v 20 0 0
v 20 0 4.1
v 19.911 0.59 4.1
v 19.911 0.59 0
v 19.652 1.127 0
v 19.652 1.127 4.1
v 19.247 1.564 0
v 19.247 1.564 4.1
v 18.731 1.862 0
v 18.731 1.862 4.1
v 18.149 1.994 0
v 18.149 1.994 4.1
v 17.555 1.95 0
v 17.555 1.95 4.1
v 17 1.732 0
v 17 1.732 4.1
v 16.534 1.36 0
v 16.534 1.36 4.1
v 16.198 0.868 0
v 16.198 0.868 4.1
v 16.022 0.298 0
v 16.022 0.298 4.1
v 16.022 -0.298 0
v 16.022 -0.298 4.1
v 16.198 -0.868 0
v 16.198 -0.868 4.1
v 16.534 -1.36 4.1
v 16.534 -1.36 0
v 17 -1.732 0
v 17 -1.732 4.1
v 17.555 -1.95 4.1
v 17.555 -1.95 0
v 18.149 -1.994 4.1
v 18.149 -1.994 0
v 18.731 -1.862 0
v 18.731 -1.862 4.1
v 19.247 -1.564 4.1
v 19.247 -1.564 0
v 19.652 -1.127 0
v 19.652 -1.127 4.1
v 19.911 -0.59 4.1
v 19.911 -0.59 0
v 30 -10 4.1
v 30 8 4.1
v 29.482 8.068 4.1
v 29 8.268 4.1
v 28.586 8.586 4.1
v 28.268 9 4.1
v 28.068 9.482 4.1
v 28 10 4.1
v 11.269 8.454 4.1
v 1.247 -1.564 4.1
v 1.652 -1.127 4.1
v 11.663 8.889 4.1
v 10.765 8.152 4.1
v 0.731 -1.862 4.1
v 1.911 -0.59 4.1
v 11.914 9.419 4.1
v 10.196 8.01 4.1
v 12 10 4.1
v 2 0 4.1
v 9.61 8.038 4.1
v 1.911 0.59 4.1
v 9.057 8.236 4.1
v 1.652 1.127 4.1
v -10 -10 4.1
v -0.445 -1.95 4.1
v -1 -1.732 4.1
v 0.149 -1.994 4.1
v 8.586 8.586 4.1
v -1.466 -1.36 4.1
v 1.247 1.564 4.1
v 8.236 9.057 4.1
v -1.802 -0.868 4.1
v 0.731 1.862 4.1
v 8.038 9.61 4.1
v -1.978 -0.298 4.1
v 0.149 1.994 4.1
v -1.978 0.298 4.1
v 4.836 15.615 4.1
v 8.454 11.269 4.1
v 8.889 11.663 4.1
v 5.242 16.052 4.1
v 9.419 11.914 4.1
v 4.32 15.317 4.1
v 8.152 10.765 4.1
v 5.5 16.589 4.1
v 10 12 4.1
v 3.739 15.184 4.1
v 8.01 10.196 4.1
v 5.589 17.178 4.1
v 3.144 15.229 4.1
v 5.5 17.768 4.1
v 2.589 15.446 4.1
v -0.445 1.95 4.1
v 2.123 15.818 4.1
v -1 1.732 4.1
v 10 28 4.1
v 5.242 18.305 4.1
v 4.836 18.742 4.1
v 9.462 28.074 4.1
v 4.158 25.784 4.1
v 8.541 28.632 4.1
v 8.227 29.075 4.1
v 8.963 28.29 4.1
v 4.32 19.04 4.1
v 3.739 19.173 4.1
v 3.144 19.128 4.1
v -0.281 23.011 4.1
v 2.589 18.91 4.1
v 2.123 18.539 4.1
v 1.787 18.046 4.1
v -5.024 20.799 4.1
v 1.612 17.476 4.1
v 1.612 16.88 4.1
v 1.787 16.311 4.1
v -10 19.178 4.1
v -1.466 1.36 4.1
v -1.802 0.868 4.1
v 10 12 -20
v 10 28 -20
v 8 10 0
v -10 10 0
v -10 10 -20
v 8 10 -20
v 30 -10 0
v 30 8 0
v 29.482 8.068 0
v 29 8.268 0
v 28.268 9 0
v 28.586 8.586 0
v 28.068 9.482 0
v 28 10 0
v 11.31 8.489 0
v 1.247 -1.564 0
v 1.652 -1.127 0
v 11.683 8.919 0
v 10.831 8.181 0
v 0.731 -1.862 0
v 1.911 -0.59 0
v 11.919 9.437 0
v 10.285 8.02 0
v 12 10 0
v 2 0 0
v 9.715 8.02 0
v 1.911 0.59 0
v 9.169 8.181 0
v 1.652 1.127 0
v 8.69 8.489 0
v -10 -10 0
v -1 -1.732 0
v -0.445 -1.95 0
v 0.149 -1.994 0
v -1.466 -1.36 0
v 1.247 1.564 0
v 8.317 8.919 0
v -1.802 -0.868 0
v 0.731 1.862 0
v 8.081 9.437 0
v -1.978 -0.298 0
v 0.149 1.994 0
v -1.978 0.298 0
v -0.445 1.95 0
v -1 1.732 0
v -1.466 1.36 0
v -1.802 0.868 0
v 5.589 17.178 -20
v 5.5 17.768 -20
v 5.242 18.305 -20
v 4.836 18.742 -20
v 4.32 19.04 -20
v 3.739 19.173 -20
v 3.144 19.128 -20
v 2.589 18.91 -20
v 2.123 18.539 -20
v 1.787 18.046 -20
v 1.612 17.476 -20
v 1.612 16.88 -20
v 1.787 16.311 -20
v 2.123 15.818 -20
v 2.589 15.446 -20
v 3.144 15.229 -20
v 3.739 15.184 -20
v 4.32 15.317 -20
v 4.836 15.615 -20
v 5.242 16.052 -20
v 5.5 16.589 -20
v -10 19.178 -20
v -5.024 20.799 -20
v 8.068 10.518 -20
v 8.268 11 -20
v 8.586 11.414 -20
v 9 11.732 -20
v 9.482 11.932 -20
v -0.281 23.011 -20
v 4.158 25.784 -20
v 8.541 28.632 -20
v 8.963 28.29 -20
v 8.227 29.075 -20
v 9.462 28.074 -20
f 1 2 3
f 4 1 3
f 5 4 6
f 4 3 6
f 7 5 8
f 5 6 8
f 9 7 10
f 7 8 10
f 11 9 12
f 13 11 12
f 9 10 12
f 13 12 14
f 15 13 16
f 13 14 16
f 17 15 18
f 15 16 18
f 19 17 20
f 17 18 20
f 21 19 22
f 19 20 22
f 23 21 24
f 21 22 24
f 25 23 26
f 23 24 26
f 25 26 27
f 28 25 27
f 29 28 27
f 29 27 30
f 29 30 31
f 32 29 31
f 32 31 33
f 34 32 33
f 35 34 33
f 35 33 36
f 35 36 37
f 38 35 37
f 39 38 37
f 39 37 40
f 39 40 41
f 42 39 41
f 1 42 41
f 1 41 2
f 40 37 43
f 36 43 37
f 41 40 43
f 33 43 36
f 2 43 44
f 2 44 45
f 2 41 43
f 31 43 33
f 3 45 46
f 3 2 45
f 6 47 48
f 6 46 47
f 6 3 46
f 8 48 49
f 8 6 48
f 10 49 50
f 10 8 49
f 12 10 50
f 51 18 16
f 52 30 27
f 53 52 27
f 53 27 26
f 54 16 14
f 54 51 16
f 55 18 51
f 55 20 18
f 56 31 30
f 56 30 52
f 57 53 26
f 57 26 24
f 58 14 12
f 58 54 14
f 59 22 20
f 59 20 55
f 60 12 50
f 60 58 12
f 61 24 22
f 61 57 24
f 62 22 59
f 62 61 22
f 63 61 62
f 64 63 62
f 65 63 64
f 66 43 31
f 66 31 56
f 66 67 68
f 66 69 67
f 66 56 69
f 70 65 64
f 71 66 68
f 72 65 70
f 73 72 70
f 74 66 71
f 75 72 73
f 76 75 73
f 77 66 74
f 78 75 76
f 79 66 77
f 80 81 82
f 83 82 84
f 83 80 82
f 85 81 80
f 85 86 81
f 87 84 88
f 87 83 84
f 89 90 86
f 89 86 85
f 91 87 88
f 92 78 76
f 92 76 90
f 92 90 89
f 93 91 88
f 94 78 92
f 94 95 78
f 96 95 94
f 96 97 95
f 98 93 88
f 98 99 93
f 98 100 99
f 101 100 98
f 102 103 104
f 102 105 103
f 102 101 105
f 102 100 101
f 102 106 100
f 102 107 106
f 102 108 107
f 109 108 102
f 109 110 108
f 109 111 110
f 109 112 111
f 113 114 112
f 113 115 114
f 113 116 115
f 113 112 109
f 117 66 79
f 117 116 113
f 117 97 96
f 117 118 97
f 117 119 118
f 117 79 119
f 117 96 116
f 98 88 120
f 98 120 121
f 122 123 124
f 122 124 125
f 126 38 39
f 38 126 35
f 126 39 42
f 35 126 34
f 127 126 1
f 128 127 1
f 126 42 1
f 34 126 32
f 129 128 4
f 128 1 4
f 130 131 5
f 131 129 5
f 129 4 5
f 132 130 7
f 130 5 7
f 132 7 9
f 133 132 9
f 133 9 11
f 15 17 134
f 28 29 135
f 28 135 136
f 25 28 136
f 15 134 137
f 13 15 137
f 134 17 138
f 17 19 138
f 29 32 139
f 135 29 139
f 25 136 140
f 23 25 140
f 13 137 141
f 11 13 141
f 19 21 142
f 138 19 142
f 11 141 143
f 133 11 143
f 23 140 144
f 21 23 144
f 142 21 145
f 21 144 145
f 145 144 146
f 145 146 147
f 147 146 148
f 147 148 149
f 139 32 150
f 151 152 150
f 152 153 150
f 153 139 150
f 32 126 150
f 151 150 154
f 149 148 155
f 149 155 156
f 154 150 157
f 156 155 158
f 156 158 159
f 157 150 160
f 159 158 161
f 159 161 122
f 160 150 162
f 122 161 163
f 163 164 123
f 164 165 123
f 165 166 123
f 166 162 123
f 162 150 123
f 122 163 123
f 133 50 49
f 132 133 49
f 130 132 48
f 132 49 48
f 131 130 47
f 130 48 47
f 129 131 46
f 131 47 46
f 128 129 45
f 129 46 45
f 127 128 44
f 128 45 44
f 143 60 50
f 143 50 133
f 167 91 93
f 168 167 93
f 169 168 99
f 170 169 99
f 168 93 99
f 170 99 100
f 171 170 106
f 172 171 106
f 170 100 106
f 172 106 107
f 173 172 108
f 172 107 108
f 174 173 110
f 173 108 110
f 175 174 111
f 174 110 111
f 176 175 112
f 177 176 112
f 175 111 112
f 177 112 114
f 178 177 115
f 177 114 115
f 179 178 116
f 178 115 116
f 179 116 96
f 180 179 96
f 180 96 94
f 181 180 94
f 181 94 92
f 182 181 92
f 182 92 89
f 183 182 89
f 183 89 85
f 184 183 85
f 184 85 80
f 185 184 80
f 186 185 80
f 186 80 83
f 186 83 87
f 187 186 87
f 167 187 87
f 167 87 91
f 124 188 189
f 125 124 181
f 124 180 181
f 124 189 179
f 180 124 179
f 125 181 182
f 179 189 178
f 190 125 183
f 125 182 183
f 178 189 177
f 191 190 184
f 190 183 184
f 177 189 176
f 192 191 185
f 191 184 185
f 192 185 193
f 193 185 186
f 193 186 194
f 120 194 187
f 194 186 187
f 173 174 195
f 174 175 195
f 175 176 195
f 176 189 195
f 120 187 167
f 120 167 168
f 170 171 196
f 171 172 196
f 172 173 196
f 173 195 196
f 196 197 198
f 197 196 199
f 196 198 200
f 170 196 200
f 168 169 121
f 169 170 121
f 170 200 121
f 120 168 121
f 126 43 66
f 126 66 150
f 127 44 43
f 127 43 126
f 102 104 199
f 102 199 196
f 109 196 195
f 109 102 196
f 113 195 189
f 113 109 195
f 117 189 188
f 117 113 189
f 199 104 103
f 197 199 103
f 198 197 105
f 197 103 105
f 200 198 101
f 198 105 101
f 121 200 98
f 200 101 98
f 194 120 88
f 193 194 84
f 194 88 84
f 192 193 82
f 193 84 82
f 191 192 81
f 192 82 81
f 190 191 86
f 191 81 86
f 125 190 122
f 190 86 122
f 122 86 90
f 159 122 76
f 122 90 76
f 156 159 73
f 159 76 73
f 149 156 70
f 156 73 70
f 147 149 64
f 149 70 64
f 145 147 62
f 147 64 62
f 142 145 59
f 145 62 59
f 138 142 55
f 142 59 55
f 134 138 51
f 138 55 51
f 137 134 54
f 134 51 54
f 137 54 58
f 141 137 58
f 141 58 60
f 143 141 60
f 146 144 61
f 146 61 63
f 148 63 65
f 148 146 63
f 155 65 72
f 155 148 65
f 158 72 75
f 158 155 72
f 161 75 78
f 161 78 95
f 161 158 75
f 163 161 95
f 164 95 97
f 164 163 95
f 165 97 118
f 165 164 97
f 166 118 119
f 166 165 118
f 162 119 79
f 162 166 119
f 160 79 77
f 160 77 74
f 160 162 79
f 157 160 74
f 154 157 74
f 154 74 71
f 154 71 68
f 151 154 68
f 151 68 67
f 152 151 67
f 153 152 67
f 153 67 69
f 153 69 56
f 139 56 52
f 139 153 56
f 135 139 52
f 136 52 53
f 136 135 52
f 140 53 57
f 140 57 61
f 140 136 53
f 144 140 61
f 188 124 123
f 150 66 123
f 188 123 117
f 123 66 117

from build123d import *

# Parameters (mm, degrees)
SKETCH_1_W          = 20
SKETCH_1_H          = 20
SKETCH_1_R          = 2
EXTRUDE_1_DEPTH     = 4.1
SKETCH_2_W          = 20
SKETCH_2_H          = 20
EXTRUDE_2_DEPTH     = 24.1
CUT_EXTRUDE_1_DEPTH = 40.759401404
SKETCH_4_R          = 2
CUT_EXTRUDE_2_DEPTH = 40.759401404
SKETCH_5_W          = 4.1
SKETCH_5_H          = 20
EXTRUDE_3_DEPTH     = 20
SKETCH_7_R          = 2
CUT_EXTRUDE_3_DEPTH = 49.793544655


with BuildPart() as part:
    # 草图1 → 凸台-拉伸1 (new body)
    with BuildSketch(Plane.XY):
        Rectangle(SKETCH_1_W, SKETCH_1_H)
        Circle(SKETCH_1_R, mode=Mode.SUBTRACT)
    extrude(amount=EXTRUDE_1_DEPTH)

    # 草图2 → 凸台-拉伸2 (add)
    with BuildSketch(Plane.XY.offset(4.1)):
        with Locations((0, 20)):
            Rectangle(SKETCH_2_W, SKETCH_2_H)
    extrude(amount=-EXTRUDE_2_DEPTH)

    # 草图3 → 切除-拉伸1 (cut, through all)
    with BuildSketch(Plane.XY.offset(4.1)):
        with BuildLine():
            Line((-10, 30), (9.2059994, 30))
            ThreePointArc((9.2059994, 30), (0.308275872, 23.337476197), (-10, 19.178371007))
            Line((-10, 19.178371007), (-10, 30))
        make_face()
    extrude(amount=-CUT_EXTRUDE_1_DEPTH, mode=Mode.SUBTRACT)

    # 草图4 → 切除-拉伸2 (cut, through all)
    with BuildSketch(Plane.XY.offset(4.1)):
        with Locations((3.589185504, 17.178371007)):
            Circle(SKETCH_4_R)
    extrude(amount=-CUT_EXTRUDE_2_DEPTH, mode=Mode.SUBTRACT)

    # 草图5 → 凸台-拉伸3 (add)
    with BuildSketch(Plane(origin=(10, 0, 0), x_dir=(0, 0, -1), z_dir=(1, 0, 0))):
        with Locations((-2.05, 0)):
            Rectangle(SKETCH_5_W, SKETCH_5_H)
    extrude(amount=EXTRUDE_3_DEPTH)

    # 草图7 → 切除-拉伸3 (cut, through all)
    with BuildSketch(Plane.XY.offset(4.1)):
        with Locations((10, 10)):
            Circle(SKETCH_7_R)
        with Locations((10, 30)):
            Circle(SKETCH_7_R)
        with Locations((30, 10)):
            Circle(SKETCH_7_R)
        with Locations((18, 0)):
            Circle(SKETCH_7_R)
    extrude(amount=-CUT_EXTRUDE_3_DEPTH, mode=Mode.SUBTRACT)


solid = part.part
